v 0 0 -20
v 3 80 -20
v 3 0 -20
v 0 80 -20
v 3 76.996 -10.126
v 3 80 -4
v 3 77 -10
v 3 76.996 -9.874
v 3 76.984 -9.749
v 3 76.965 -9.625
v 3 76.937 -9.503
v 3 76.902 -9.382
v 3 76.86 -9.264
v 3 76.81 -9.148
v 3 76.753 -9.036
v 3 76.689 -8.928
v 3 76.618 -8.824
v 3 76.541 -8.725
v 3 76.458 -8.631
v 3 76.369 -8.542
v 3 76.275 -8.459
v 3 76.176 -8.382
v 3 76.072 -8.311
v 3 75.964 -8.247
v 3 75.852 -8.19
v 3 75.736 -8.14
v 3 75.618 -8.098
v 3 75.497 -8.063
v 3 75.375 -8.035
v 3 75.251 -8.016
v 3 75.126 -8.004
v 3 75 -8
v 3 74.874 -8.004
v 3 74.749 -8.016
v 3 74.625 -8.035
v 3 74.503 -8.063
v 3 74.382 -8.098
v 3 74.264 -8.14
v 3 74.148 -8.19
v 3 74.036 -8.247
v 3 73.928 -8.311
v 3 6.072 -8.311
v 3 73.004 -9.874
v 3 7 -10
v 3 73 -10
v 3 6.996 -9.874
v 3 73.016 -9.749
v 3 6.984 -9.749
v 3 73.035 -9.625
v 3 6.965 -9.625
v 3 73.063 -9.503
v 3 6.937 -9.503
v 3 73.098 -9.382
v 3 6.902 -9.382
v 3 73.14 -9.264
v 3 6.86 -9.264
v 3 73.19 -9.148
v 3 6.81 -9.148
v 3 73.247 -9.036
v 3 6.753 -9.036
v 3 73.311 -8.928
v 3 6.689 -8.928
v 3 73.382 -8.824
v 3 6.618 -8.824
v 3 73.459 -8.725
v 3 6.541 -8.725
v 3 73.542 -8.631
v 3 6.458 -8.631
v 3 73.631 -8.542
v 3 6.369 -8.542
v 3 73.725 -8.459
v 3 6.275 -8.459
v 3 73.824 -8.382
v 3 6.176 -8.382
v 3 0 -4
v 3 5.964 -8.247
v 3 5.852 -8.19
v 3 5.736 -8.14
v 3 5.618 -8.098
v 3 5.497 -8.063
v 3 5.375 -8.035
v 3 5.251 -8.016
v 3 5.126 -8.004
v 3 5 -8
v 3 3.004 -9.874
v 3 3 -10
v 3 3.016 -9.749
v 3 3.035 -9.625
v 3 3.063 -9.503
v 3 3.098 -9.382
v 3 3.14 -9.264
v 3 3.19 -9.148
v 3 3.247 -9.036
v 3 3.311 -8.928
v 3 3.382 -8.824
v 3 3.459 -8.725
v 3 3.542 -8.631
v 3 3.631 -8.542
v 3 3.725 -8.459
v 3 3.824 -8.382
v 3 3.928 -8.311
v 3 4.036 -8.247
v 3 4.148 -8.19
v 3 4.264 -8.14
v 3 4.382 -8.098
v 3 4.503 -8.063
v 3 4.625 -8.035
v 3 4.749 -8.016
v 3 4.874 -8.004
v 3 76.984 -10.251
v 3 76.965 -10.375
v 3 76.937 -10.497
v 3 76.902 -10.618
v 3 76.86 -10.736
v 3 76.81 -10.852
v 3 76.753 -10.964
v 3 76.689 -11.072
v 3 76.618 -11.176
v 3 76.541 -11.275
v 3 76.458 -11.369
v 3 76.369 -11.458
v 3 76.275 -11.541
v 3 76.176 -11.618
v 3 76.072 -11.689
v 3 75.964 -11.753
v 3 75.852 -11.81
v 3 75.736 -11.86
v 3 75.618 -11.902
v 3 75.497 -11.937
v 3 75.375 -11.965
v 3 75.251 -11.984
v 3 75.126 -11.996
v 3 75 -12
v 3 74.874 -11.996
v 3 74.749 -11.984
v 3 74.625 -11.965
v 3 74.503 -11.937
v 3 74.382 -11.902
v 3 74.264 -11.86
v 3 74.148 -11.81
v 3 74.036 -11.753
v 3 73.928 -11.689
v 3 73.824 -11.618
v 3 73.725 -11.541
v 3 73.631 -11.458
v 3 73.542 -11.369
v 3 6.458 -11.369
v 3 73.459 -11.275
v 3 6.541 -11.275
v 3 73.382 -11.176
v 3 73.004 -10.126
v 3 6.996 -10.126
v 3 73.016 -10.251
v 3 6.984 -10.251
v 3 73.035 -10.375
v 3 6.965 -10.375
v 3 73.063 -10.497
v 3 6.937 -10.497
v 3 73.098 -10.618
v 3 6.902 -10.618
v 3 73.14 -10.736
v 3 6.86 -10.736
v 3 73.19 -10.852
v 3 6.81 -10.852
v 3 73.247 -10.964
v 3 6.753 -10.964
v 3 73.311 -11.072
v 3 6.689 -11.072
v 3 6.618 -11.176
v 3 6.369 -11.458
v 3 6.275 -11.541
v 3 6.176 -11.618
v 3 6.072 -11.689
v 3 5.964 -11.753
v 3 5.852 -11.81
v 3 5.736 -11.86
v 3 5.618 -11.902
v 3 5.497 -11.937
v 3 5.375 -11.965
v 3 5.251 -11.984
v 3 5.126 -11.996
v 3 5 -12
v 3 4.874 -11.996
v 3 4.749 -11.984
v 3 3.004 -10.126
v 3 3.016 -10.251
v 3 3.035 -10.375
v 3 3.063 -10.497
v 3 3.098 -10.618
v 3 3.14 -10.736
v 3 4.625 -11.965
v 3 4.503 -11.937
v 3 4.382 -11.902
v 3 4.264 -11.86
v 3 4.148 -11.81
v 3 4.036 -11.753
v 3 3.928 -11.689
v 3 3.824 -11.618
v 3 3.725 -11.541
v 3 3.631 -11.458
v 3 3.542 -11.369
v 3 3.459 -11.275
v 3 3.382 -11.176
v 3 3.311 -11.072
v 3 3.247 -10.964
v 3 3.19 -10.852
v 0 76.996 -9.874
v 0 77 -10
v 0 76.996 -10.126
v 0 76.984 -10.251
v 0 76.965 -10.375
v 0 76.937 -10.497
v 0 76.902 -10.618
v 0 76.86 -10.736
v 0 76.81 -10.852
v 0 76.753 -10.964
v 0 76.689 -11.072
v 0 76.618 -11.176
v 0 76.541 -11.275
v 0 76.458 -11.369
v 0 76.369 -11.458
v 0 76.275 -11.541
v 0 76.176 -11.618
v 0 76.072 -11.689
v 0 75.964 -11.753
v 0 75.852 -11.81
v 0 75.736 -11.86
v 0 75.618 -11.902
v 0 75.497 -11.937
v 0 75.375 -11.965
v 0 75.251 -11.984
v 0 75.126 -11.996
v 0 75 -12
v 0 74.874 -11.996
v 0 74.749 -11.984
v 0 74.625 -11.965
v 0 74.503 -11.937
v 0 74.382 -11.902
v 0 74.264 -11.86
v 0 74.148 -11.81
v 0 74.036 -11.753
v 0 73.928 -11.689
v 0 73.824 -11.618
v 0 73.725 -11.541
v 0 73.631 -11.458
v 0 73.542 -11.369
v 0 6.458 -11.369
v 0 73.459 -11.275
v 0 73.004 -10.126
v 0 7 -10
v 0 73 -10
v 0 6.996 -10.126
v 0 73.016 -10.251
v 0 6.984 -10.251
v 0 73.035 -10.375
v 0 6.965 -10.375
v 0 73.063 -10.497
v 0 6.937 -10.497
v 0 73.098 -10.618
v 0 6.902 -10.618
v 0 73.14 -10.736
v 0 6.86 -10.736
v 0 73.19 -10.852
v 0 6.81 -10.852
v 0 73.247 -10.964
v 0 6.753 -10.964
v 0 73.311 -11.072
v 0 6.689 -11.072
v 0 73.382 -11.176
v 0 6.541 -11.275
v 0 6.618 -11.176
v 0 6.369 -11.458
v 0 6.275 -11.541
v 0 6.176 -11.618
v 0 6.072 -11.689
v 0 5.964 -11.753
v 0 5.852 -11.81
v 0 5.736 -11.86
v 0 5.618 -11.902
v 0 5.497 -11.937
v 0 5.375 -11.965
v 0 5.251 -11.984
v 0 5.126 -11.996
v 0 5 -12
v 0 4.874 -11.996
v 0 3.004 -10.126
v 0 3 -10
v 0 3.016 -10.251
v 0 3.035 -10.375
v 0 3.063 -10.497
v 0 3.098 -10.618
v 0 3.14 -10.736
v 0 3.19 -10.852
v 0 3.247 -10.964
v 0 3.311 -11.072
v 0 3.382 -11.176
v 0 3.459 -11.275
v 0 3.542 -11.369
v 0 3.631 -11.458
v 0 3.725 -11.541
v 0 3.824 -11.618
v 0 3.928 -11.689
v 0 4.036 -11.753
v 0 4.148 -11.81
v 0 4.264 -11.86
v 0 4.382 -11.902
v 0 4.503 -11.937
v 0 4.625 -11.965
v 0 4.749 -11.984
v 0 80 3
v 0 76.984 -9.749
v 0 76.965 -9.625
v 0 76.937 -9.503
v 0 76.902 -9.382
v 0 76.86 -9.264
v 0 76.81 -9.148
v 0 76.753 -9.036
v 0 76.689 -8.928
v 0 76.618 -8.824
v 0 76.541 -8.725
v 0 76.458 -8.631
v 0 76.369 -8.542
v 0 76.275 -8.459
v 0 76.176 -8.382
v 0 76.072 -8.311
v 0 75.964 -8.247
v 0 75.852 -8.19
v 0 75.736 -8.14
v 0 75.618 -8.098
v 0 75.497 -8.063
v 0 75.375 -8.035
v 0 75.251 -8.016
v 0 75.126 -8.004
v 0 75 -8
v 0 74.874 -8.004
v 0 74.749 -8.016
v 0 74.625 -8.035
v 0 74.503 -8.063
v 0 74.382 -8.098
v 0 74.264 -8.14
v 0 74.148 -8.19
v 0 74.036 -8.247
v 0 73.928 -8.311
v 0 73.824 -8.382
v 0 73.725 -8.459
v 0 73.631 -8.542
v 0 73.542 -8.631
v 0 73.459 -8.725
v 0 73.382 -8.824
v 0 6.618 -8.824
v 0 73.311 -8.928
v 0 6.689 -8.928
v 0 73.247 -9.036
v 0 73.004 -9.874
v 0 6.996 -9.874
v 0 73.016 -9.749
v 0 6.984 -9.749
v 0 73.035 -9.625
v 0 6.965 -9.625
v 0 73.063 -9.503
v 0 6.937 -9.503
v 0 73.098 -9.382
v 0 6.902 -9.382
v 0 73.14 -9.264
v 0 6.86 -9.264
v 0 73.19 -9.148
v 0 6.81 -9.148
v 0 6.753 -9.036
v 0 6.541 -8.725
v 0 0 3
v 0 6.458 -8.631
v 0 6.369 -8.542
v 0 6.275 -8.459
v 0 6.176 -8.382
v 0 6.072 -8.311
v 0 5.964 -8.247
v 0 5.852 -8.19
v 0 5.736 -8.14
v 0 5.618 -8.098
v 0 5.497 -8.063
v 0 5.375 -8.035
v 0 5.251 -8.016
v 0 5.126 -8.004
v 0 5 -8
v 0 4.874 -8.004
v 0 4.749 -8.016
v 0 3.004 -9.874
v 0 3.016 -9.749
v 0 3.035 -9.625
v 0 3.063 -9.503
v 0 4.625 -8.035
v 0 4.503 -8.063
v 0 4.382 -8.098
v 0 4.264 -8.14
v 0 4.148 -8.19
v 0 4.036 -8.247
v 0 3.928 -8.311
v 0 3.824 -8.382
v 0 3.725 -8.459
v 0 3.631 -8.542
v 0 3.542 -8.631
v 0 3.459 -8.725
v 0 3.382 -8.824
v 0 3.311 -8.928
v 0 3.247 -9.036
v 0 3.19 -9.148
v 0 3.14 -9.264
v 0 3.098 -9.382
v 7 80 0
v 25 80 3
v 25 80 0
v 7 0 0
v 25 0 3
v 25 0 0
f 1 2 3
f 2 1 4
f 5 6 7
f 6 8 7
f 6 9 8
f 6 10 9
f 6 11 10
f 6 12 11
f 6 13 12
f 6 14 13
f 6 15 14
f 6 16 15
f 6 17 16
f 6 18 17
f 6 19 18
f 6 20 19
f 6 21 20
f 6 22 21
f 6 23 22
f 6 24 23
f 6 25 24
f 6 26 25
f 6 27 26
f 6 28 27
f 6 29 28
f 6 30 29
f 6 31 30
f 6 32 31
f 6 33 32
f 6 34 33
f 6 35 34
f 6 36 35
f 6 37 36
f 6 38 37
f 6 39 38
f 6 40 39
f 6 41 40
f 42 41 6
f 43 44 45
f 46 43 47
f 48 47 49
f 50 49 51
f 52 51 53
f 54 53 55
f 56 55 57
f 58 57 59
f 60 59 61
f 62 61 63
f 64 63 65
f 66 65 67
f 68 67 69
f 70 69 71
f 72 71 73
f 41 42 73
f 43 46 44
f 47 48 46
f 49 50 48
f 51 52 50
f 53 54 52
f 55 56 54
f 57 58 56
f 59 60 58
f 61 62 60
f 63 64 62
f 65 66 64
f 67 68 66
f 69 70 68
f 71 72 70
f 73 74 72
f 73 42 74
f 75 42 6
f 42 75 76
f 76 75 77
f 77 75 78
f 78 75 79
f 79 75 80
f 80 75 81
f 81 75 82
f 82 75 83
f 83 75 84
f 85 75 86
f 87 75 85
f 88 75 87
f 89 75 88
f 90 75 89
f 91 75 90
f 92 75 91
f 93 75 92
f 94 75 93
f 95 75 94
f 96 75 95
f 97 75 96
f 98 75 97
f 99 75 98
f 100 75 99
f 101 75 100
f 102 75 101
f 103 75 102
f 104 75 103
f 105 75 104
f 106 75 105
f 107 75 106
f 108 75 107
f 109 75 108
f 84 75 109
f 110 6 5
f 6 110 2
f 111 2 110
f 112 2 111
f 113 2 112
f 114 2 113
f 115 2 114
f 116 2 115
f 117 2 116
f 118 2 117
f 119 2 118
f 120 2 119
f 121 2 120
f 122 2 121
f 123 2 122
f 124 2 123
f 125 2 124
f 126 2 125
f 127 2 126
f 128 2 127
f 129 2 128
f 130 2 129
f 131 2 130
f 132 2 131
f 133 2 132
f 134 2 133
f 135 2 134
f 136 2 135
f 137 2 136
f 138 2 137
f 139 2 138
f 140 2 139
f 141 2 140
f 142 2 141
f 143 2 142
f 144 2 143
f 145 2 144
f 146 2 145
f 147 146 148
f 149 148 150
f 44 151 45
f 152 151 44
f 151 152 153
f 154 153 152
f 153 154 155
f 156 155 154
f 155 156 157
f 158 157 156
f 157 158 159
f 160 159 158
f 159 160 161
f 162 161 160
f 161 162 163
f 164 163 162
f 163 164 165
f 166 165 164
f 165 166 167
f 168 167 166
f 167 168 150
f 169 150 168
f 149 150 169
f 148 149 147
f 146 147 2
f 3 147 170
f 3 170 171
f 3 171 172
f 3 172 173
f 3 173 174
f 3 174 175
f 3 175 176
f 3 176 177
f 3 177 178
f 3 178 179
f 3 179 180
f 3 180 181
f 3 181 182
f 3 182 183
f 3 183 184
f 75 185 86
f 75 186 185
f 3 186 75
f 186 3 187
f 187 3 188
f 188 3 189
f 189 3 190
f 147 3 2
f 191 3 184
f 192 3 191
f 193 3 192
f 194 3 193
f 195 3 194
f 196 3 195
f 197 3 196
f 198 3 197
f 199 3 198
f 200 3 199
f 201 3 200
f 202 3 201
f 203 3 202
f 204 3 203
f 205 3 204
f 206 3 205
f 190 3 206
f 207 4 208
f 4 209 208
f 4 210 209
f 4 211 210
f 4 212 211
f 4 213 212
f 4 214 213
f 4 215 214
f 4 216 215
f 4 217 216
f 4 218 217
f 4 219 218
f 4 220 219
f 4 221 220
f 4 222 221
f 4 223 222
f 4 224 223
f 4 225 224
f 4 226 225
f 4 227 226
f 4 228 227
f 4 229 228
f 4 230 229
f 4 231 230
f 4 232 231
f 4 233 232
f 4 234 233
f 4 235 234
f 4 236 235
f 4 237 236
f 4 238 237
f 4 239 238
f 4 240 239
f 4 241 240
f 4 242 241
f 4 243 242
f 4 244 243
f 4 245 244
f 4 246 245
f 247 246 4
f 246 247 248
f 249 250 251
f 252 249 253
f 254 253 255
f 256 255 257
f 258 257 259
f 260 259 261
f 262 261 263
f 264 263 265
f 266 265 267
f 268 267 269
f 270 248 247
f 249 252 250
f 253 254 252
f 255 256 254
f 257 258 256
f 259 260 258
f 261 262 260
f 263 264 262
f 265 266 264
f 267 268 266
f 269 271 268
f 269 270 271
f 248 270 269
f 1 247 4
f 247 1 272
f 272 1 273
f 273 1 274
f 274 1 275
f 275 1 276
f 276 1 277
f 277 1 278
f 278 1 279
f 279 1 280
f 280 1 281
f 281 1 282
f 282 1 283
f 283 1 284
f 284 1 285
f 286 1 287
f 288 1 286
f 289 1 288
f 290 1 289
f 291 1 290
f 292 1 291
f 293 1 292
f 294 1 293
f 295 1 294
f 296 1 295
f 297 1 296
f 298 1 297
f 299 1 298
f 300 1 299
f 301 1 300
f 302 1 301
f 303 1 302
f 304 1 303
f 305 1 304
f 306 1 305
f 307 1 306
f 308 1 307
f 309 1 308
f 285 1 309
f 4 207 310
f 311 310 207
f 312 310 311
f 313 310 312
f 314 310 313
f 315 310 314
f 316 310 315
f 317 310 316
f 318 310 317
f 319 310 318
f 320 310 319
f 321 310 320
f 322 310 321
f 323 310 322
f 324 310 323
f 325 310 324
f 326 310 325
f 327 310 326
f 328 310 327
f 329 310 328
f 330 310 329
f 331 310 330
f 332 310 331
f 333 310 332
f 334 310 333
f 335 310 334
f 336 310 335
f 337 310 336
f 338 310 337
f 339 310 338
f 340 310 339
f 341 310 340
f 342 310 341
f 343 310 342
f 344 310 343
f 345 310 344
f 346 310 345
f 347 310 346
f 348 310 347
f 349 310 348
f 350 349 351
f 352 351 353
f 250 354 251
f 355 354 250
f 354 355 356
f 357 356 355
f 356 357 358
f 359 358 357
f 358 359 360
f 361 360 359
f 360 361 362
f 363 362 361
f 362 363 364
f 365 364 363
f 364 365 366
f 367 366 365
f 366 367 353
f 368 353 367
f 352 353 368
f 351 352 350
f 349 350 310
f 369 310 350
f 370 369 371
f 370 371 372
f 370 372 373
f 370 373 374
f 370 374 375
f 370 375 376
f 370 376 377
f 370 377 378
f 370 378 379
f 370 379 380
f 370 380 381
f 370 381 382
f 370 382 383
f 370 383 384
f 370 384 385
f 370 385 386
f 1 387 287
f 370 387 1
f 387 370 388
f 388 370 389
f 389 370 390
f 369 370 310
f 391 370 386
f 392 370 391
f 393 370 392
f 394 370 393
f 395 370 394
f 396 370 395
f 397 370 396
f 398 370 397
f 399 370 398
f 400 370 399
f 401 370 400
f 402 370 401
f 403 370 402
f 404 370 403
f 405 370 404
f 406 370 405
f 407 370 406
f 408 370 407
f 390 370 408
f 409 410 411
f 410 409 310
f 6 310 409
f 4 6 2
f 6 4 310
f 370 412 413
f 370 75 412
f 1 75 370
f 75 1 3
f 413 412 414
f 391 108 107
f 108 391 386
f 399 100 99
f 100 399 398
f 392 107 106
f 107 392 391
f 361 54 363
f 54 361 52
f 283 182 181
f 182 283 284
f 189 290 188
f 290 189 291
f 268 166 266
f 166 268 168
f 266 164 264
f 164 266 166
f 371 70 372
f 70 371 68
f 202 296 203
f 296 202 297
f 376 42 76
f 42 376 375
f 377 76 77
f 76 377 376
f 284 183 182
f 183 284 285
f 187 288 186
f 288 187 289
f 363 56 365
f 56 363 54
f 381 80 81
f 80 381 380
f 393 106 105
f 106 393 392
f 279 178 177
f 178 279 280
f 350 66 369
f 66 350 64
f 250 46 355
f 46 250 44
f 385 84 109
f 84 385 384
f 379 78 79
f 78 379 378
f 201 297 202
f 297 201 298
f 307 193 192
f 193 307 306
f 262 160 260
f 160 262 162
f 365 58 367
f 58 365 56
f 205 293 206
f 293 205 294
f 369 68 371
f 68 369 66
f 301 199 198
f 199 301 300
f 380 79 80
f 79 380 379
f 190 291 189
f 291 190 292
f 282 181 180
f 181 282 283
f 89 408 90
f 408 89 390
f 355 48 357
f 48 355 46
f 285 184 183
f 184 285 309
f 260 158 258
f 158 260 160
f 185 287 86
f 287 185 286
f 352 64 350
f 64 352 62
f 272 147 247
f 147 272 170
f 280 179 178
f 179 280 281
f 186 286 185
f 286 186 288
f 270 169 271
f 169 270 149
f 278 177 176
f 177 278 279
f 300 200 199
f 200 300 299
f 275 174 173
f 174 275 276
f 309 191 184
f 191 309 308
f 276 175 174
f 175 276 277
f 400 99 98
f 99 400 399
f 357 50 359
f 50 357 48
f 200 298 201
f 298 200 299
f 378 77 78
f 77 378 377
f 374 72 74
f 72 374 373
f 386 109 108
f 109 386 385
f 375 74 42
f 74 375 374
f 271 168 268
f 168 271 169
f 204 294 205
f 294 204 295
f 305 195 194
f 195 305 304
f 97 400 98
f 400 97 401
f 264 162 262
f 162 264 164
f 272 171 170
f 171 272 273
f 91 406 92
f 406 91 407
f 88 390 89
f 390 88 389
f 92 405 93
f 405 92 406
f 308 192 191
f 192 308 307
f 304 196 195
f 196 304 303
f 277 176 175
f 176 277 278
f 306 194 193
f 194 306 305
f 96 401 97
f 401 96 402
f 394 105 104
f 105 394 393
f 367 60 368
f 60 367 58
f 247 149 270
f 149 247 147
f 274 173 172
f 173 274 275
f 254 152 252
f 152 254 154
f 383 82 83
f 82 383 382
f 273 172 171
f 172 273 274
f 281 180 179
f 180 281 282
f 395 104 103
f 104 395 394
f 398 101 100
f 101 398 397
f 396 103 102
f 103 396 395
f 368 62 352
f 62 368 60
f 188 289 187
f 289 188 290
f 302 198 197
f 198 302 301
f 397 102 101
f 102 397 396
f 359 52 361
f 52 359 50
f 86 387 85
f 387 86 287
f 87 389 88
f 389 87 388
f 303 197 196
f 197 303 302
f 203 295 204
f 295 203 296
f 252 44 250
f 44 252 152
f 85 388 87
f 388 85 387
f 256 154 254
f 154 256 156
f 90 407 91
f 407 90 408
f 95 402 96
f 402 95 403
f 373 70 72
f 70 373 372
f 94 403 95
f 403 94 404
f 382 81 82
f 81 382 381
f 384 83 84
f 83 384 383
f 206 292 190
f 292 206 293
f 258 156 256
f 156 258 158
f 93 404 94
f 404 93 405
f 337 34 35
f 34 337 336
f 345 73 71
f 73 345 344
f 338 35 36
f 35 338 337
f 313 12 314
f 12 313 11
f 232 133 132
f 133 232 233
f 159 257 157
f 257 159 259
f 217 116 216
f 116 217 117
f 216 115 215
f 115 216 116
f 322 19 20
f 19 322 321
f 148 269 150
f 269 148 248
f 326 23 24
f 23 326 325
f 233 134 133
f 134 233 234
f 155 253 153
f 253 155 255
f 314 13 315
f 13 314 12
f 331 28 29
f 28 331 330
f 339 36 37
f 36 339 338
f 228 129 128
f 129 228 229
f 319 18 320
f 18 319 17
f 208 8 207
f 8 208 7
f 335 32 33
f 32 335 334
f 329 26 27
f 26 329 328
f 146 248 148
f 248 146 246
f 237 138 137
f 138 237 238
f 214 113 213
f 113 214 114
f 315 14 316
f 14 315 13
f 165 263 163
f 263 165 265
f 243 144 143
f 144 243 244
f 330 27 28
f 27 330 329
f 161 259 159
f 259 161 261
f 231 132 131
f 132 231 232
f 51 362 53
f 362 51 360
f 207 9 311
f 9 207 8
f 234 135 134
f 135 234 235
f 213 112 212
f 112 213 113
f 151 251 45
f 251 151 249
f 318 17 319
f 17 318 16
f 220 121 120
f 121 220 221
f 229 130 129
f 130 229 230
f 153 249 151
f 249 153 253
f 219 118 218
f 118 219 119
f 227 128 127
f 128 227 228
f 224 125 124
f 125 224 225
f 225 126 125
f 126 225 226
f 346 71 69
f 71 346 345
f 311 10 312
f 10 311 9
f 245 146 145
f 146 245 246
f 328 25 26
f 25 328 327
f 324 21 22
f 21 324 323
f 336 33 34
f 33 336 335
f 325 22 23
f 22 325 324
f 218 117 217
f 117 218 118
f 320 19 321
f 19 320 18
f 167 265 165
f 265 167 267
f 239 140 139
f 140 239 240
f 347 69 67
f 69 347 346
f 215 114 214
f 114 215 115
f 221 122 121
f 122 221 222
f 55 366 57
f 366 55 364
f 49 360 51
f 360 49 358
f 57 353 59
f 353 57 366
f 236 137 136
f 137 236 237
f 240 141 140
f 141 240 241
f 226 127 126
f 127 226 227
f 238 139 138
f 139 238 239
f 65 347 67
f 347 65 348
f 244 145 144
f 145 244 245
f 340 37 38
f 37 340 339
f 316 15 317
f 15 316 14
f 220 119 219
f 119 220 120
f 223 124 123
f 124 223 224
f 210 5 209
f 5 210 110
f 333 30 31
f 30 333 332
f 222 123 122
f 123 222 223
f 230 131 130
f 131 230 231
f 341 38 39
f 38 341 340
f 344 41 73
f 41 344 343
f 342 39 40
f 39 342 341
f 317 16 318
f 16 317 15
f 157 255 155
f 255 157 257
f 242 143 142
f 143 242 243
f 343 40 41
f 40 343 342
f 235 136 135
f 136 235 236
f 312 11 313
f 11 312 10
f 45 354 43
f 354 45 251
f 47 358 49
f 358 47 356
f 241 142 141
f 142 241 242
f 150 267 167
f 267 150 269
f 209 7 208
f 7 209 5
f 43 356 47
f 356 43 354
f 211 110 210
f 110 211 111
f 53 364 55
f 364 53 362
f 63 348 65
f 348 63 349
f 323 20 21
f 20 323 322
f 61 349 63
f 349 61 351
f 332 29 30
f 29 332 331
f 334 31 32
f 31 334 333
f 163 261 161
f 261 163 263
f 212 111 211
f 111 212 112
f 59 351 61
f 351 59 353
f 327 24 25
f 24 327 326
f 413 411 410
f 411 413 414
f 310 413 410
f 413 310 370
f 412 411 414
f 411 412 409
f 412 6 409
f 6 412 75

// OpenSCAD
$fn=100;

module fixation_etage2(L,e) {
	 // e = epaisseur
	cube([25,L,e]); 
	difference() {
		rotate([0,90,0])cube([20,L,e]);
		translate([-1,5,-10])rotate([0,90,0])cylinder(d=4,h=7);
		translate([-1,L-5,-10])rotate([0,90,0])cylinder(d=4,h=7);
	}
	translate([0,L,0]) rotate([90,0,0])linear_extrude(height = L)polygon(
		points=[ [0,0],[7,0],[0,-7] ],
		paths=[ [0,1,2] ]
	);	
}

fixation_etage2(80,3);
